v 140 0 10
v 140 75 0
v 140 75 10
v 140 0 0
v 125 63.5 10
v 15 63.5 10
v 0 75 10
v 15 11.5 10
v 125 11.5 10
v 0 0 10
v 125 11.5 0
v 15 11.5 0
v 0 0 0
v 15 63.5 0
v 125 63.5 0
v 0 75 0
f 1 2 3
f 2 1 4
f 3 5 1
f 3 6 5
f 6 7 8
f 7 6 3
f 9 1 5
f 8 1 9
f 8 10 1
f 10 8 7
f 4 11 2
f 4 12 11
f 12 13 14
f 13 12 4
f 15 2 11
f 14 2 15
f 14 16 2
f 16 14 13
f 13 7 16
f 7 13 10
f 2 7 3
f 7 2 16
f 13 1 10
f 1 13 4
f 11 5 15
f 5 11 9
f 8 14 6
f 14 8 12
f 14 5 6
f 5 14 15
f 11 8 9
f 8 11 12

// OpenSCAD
// Definition size of housing
// **************************

length =140;
width      = 75;    
height      = 10;     
studheight    = 10;

cutoutlength = 110;
cutoutwidth = 52;

flangewidth = 22;
flangeheight = 4;



//Definition of circle angular resolution
resol        = 64;           // Identical to housing !!!



difference () {
    
    union() {

    translate ([0,0,0]) cube([length,width,height]); //back
    }

    translate ([(length-cutoutlength)/2,(width-cutoutwidth)/2,0]) cube([cutoutlength,cutoutwidth,height+1]); //back
    //translate ([length-20,width/2,-1]) cylinder (h=8+2, r=2.5, $fn=resol);
}
